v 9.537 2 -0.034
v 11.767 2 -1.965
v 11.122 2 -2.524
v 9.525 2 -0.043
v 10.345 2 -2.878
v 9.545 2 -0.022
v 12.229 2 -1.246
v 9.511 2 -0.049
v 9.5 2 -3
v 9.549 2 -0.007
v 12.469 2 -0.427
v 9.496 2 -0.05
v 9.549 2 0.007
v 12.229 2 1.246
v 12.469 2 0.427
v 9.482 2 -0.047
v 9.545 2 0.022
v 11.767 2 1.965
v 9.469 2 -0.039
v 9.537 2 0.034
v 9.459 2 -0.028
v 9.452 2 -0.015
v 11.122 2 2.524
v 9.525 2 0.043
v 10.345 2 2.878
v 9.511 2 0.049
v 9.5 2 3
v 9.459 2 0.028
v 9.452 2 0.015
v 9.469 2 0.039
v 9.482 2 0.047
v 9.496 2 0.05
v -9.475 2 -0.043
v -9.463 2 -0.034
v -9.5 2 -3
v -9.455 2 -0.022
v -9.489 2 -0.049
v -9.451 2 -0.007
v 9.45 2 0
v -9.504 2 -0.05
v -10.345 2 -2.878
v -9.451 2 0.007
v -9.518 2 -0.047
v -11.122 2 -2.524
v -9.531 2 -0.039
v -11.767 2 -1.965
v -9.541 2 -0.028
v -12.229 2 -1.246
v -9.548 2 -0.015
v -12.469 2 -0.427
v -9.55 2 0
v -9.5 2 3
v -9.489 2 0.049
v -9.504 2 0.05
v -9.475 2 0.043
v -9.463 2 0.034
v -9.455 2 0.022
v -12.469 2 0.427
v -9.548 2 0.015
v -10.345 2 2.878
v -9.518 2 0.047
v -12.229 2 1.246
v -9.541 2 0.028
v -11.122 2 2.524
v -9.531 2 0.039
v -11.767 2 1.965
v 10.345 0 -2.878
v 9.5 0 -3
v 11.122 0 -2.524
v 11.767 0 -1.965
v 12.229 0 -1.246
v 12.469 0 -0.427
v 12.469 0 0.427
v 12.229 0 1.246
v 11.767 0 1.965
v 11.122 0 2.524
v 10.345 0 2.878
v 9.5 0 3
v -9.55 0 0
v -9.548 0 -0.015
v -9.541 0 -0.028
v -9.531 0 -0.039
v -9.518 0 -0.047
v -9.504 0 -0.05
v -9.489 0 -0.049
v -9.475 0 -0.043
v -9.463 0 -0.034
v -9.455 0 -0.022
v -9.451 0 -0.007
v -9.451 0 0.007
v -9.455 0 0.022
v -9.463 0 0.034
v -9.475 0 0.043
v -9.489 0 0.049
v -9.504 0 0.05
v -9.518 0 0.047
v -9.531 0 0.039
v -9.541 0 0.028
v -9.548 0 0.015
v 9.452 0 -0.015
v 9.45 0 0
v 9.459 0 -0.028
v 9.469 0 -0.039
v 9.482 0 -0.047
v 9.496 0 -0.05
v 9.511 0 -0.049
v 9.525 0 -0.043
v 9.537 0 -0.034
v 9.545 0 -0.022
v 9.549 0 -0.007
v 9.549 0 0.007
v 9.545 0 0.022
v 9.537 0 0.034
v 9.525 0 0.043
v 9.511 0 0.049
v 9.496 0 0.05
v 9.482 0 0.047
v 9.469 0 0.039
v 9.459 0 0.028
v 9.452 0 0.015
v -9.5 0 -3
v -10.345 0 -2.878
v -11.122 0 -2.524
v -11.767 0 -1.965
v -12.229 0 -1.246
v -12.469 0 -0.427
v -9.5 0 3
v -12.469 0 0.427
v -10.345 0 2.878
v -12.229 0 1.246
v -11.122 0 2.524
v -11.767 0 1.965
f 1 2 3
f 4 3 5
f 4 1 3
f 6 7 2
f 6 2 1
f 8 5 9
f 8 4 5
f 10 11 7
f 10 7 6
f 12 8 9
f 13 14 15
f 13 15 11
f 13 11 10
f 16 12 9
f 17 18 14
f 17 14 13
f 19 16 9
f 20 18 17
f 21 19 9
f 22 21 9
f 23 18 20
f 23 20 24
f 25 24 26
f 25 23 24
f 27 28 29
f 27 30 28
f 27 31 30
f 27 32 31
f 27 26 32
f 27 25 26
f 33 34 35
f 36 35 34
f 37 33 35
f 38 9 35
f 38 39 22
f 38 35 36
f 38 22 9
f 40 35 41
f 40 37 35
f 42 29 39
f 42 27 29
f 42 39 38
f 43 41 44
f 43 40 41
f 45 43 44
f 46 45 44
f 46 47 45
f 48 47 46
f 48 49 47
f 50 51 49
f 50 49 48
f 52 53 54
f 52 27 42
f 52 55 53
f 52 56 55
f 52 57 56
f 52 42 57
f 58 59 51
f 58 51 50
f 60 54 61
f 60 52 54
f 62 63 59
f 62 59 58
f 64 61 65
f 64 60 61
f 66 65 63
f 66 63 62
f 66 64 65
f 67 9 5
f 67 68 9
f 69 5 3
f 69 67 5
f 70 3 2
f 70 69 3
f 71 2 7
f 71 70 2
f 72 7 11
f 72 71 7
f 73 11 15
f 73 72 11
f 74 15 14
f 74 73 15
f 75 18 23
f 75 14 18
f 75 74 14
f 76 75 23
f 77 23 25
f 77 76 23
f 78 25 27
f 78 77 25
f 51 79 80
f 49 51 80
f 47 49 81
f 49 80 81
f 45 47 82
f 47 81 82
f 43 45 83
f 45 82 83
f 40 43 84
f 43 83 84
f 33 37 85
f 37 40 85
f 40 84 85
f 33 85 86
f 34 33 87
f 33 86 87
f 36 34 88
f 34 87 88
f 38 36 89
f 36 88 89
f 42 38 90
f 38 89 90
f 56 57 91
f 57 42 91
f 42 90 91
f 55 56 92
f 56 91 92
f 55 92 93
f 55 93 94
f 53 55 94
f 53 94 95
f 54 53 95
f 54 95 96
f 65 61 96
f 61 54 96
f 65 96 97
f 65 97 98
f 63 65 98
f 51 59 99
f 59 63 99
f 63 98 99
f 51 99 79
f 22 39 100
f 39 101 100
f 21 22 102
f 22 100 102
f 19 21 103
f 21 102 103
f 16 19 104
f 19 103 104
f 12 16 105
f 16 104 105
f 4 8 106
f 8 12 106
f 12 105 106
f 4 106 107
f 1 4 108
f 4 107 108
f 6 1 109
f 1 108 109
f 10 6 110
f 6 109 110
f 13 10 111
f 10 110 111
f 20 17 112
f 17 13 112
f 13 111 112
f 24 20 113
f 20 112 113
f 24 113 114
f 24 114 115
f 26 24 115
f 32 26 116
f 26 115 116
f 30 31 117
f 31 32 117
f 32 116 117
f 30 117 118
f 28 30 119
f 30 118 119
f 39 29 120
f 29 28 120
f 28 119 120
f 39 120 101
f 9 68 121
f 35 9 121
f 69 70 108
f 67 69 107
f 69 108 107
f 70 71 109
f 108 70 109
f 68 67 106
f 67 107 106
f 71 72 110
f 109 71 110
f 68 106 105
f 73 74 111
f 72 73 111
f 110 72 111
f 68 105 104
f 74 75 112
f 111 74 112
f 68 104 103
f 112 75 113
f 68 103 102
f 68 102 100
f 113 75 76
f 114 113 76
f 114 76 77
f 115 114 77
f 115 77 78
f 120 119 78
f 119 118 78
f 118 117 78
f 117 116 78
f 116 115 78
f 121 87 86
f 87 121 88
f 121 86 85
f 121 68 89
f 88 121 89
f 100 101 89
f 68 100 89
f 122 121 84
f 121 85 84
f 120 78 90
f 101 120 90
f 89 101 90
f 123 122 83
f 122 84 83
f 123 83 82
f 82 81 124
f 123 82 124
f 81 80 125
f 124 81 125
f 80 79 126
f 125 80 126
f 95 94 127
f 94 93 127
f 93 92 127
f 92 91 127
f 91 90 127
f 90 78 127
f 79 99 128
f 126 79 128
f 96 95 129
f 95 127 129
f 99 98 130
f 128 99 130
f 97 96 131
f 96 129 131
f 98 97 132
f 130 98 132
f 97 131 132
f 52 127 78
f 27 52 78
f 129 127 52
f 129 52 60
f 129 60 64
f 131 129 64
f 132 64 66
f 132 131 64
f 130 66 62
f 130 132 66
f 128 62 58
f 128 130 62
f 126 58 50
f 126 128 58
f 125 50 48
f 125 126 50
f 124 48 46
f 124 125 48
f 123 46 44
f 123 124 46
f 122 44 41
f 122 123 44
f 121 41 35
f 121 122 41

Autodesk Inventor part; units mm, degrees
ref_plane "YZ Plane" through (0, 0, 0) normal (1, 0, 0) x (0, 1, 0)
ref_plane "XZ Plane" through (0, 0, 0) normal (0, 1, 0) x (-1, 0, 0)
ref_plane "XY Plane" through (0, 0, 0) normal (0, 0, 1) x (1, 0, 0)
sketch "Sketch1" plane through (0, 0, 0) normal (0, 1, 0) x (-1, 0, 0)
  line L0 (9.5, 3) -> (-9.5, 3)
  line L1 (-9.5, -3) -> (9.5, -3)
  circle A0 centre (-9.5, 0) radius 3
  circle A1 centre (9.5, 0) radius 3
  circle A2 centre (-9.5, 0) radius 0.05
  circle A3 centre (9.5, 0) radius 0.05
  line L2 (-9.5, 3) -> (9.5, 3)
  line L3 (-9.5, -3) -> (9.5, -3)
  arc A4 (-9.5, 3) -> (-9.5, -3) centre (-9.5, 0) ccw
  arc A5 (9.5, -3) -> (9.5, 3) centre (9.5, 0) ccw
  point P0 (0, 0)
  dimension "d0" = 19
  dimension "d1" = 6
  dimension "d2" = 0.1
  dimension "d3" = 0.1
extrude "Extrusion1" add sketch "Sketch1" along normal blind 2
properties part number "tahlo_sablona_servo"
